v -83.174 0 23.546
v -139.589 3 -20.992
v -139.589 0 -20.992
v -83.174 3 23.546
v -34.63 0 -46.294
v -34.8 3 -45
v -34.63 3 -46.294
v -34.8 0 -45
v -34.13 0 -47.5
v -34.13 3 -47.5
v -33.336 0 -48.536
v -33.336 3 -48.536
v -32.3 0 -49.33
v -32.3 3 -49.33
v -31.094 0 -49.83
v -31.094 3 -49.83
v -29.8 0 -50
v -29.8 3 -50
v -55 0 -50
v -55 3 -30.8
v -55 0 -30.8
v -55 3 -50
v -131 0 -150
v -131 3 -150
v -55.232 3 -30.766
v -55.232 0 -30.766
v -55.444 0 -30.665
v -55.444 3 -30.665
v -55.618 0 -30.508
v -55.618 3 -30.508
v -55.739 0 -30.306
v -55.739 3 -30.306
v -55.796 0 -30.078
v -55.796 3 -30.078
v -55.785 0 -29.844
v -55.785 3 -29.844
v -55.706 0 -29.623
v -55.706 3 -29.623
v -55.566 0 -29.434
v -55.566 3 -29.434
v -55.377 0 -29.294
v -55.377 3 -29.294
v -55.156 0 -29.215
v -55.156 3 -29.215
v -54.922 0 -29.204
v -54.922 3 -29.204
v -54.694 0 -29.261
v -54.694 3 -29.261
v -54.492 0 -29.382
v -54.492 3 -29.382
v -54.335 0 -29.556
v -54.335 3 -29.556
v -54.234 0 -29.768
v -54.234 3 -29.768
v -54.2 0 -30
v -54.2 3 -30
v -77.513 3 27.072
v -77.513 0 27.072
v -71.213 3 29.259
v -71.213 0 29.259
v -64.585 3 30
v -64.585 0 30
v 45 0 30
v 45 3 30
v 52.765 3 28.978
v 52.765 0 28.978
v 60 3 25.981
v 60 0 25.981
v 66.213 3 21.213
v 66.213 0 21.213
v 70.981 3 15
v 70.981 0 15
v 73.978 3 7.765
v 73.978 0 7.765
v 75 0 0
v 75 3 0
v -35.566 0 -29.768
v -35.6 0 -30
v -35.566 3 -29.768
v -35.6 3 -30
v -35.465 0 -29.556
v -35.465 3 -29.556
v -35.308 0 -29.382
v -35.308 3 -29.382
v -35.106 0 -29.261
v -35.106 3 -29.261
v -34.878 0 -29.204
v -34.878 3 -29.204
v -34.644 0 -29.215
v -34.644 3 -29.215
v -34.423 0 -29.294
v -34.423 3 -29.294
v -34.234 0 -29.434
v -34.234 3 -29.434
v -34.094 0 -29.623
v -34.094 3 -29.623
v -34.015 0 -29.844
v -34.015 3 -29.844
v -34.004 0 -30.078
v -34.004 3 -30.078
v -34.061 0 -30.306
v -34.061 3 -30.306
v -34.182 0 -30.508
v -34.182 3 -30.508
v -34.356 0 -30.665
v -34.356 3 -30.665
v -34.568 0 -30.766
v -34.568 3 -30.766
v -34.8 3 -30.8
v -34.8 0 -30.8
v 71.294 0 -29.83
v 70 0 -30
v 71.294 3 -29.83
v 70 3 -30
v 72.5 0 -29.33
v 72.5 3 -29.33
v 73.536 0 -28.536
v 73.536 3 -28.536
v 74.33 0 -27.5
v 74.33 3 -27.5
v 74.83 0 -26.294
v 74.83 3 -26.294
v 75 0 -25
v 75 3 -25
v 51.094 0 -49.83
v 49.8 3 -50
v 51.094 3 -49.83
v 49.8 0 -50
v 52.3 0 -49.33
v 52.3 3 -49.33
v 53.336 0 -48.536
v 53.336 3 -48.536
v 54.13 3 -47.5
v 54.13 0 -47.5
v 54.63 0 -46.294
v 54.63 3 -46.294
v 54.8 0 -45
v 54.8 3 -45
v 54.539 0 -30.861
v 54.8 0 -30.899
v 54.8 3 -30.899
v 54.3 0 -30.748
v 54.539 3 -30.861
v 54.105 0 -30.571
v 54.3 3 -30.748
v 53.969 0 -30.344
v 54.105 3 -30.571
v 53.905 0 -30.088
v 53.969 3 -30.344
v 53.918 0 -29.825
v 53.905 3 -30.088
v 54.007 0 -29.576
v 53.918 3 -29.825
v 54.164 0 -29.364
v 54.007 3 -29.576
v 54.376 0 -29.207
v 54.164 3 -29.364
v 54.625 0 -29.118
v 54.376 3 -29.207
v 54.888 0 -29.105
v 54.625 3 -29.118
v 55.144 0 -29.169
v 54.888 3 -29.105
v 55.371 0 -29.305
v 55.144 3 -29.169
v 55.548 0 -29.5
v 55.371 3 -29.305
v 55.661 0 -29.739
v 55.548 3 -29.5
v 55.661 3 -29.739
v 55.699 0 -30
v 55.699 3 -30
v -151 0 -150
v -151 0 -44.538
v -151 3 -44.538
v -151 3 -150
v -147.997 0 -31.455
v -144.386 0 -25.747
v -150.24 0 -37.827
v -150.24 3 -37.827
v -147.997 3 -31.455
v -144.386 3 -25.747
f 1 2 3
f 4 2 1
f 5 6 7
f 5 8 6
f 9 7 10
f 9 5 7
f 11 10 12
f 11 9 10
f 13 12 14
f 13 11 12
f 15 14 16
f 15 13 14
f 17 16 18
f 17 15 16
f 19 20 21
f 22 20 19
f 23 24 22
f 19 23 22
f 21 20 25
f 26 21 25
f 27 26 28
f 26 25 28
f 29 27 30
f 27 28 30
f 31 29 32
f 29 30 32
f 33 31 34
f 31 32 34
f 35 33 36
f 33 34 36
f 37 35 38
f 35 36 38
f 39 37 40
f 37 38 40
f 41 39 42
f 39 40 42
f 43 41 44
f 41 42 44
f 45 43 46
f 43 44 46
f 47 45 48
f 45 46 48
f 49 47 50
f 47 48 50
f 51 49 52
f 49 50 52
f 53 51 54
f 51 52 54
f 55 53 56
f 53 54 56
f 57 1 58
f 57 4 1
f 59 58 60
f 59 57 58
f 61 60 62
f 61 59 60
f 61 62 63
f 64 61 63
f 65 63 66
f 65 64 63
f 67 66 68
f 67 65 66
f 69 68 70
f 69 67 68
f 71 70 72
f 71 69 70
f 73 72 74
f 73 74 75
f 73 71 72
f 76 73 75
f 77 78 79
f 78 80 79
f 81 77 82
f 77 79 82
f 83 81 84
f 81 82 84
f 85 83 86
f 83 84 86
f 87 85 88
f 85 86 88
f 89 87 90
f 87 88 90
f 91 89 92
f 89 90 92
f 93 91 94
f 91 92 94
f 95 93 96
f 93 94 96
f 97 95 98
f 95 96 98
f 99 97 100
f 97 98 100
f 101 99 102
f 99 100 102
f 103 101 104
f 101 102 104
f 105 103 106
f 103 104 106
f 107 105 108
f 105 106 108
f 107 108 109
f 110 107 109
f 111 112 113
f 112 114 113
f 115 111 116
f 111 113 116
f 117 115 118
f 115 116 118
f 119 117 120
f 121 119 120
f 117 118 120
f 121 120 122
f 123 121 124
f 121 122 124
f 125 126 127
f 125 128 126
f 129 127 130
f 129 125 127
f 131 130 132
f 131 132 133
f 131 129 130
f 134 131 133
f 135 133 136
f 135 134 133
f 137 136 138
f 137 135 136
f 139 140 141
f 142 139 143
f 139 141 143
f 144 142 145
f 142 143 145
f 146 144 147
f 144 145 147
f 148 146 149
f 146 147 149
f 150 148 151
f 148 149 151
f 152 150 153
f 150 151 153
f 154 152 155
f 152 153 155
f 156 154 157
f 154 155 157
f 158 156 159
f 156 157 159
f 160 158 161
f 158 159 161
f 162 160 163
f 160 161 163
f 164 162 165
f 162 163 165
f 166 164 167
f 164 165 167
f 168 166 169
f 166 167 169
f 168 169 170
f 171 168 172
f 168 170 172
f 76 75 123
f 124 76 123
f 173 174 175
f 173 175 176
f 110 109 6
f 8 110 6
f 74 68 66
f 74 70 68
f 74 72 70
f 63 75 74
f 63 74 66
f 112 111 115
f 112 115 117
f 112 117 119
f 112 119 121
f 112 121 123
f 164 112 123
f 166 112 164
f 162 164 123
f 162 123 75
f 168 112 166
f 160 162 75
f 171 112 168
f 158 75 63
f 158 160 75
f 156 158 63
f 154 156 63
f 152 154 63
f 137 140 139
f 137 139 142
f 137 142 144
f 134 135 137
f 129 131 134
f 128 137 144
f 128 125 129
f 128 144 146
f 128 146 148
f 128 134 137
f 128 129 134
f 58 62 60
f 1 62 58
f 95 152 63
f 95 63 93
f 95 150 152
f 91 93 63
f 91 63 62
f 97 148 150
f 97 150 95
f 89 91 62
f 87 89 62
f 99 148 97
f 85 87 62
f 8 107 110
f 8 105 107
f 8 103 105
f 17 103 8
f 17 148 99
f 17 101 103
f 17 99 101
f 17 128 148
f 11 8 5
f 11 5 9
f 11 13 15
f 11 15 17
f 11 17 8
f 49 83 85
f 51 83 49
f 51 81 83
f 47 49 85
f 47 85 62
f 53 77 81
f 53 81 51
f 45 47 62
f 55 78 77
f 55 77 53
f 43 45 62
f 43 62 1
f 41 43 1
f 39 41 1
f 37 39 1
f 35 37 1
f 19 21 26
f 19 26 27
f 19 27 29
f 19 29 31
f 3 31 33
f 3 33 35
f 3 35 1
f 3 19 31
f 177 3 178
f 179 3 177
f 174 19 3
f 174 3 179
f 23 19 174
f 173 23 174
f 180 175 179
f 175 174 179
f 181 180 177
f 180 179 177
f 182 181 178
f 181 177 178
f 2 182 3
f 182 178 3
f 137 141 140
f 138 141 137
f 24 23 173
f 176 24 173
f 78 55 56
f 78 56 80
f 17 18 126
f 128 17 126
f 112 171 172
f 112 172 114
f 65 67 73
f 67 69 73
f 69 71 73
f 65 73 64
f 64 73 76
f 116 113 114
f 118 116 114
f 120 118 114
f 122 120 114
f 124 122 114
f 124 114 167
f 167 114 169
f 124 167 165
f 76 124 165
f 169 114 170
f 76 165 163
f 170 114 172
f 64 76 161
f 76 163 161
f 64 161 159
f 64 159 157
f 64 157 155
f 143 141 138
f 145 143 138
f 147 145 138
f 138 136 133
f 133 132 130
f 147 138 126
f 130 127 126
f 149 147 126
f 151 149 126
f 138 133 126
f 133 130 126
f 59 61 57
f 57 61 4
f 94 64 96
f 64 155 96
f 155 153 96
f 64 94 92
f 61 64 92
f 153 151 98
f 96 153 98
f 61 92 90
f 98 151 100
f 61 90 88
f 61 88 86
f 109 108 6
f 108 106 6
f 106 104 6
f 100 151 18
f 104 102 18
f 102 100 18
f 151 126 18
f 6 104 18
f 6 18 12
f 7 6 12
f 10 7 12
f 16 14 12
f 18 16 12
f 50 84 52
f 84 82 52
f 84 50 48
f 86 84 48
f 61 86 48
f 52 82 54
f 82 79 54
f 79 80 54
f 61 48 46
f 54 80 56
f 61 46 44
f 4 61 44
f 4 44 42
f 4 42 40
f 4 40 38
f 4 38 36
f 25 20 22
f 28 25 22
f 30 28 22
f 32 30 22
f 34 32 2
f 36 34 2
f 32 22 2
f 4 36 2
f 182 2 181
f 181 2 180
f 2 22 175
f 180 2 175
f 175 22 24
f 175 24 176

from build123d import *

# Parameters (mm, degrees)
SKETCH1_W           = 150
SKETCH1_H           = 60
BOSS_EXTRUDE1_DEPTH = 3
FILLET1_R           = 30
SKETCH2_W           = 89.6
SKETCH2_H           = 20
BOSS_EXTRUDE2_DEPTH = 3
FILLET2_R           = 30
SKETCH3_R           = 0.8
SKETCH3_R_2         = 0.899402105
CUT_EXTRUDE1_DEPTH  = 160.091168831
FILLET3_R           = 5
SKETCH4_W           = 20
SKETCH4_H           = 100
BOSS_EXTRUDE3_DEPTH = 3
BOSS_EXTRUDE4_DEPTH = 3


with BuildPart() as part:
    # Sketch1 → Boss-Extrude1 (new body)
    with BuildSketch(Plane(origin=(0, 0, 0), x_dir=(1, 0, 0), z_dir=(0, 1, 0))):
        Rectangle(SKETCH1_W, SKETCH1_H)
    extrude(amount=BOSS_EXTRUDE1_DEPTH)

    # Fillet1
    fillet1_edges = [part.edges().sort_by_distance(p)[0] for p in [
        (75, 1.5, 30),
    ]]
    fillet(fillet1_edges, radius=FILLET1_R)

    # Sketch2 → Boss-Extrude2 (add)
    with BuildSketch(Plane(origin=(0, 3, 0), x_dir=(1, 0, 0), z_dir=(0, 1, 0))):
        Polygon((-75, 30), (-55, 30), (-55, 50), (-151, 50), (-151, 30), align=None)
        Polygon((-75, -30), (-75, 30), (-151, 30), align=None)
        with Locations((10, 40)):
            Rectangle(SKETCH2_W, SKETCH2_H)
    extrude(amount=-BOSS_EXTRUDE2_DEPTH)

    # Fillet2
    fillet2_edges = [part.edges().sort_by_distance(p)[0] for p in [
        (-151, 1.5, -30),
        (-75, 1.5, 30),
    ]]
    fillet(fillet2_edges, radius=FILLET2_R)

    # Sketch3 → Cut-Extrude1 (cut, through all)
    with BuildSketch(Plane(origin=(0, 3, 0), x_dir=(1, 0, 0), z_dir=(0, 1, 0))):
        with Locations((-55, 30)):
            Circle(SKETCH3_R)
        with Locations((-34.8, 30)):
            Circle(SKETCH3_R)
        with Locations((54.8, 30)):
            Circle(SKETCH3_R_2)
    extrude(amount=-CUT_EXTRUDE1_DEPTH, mode=Mode.SUBTRACT)

    # Fillet3
    fillet3_edges = [part.edges().sort_by_distance(p)[0] for p in [
        (-34.8, 1.5, -50),
        (54.8, 1.5, -50),
        (75, 1.5, -30),
    ]]
    fillet(fillet3_edges, radius=FILLET3_R)

    # Sketch4 → Boss-Extrude3 (add)
    with BuildSketch(Plane(origin=(0, 0, 0), x_dir=(-1, 0, 0), z_dir=(0, -1, 0))):
        with Locations((141, 100)):
            Rectangle(SKETCH4_W, SKETCH4_H)
    extrude(amount=-BOSS_EXTRUDE3_DEPTH)

    # Sketch5 → Boss-Extrude4 (add)
    with BuildSketch(Plane(origin=(0, 3, 0), x_dir=(1, 0, 0), z_dir=(0, 1, 0))):
        Polygon((-131, 150), (-55, 50), (-131, 50), align=None)
    extrude(amount=-BOSS_EXTRUDE4_DEPTH)


solid = part.part
